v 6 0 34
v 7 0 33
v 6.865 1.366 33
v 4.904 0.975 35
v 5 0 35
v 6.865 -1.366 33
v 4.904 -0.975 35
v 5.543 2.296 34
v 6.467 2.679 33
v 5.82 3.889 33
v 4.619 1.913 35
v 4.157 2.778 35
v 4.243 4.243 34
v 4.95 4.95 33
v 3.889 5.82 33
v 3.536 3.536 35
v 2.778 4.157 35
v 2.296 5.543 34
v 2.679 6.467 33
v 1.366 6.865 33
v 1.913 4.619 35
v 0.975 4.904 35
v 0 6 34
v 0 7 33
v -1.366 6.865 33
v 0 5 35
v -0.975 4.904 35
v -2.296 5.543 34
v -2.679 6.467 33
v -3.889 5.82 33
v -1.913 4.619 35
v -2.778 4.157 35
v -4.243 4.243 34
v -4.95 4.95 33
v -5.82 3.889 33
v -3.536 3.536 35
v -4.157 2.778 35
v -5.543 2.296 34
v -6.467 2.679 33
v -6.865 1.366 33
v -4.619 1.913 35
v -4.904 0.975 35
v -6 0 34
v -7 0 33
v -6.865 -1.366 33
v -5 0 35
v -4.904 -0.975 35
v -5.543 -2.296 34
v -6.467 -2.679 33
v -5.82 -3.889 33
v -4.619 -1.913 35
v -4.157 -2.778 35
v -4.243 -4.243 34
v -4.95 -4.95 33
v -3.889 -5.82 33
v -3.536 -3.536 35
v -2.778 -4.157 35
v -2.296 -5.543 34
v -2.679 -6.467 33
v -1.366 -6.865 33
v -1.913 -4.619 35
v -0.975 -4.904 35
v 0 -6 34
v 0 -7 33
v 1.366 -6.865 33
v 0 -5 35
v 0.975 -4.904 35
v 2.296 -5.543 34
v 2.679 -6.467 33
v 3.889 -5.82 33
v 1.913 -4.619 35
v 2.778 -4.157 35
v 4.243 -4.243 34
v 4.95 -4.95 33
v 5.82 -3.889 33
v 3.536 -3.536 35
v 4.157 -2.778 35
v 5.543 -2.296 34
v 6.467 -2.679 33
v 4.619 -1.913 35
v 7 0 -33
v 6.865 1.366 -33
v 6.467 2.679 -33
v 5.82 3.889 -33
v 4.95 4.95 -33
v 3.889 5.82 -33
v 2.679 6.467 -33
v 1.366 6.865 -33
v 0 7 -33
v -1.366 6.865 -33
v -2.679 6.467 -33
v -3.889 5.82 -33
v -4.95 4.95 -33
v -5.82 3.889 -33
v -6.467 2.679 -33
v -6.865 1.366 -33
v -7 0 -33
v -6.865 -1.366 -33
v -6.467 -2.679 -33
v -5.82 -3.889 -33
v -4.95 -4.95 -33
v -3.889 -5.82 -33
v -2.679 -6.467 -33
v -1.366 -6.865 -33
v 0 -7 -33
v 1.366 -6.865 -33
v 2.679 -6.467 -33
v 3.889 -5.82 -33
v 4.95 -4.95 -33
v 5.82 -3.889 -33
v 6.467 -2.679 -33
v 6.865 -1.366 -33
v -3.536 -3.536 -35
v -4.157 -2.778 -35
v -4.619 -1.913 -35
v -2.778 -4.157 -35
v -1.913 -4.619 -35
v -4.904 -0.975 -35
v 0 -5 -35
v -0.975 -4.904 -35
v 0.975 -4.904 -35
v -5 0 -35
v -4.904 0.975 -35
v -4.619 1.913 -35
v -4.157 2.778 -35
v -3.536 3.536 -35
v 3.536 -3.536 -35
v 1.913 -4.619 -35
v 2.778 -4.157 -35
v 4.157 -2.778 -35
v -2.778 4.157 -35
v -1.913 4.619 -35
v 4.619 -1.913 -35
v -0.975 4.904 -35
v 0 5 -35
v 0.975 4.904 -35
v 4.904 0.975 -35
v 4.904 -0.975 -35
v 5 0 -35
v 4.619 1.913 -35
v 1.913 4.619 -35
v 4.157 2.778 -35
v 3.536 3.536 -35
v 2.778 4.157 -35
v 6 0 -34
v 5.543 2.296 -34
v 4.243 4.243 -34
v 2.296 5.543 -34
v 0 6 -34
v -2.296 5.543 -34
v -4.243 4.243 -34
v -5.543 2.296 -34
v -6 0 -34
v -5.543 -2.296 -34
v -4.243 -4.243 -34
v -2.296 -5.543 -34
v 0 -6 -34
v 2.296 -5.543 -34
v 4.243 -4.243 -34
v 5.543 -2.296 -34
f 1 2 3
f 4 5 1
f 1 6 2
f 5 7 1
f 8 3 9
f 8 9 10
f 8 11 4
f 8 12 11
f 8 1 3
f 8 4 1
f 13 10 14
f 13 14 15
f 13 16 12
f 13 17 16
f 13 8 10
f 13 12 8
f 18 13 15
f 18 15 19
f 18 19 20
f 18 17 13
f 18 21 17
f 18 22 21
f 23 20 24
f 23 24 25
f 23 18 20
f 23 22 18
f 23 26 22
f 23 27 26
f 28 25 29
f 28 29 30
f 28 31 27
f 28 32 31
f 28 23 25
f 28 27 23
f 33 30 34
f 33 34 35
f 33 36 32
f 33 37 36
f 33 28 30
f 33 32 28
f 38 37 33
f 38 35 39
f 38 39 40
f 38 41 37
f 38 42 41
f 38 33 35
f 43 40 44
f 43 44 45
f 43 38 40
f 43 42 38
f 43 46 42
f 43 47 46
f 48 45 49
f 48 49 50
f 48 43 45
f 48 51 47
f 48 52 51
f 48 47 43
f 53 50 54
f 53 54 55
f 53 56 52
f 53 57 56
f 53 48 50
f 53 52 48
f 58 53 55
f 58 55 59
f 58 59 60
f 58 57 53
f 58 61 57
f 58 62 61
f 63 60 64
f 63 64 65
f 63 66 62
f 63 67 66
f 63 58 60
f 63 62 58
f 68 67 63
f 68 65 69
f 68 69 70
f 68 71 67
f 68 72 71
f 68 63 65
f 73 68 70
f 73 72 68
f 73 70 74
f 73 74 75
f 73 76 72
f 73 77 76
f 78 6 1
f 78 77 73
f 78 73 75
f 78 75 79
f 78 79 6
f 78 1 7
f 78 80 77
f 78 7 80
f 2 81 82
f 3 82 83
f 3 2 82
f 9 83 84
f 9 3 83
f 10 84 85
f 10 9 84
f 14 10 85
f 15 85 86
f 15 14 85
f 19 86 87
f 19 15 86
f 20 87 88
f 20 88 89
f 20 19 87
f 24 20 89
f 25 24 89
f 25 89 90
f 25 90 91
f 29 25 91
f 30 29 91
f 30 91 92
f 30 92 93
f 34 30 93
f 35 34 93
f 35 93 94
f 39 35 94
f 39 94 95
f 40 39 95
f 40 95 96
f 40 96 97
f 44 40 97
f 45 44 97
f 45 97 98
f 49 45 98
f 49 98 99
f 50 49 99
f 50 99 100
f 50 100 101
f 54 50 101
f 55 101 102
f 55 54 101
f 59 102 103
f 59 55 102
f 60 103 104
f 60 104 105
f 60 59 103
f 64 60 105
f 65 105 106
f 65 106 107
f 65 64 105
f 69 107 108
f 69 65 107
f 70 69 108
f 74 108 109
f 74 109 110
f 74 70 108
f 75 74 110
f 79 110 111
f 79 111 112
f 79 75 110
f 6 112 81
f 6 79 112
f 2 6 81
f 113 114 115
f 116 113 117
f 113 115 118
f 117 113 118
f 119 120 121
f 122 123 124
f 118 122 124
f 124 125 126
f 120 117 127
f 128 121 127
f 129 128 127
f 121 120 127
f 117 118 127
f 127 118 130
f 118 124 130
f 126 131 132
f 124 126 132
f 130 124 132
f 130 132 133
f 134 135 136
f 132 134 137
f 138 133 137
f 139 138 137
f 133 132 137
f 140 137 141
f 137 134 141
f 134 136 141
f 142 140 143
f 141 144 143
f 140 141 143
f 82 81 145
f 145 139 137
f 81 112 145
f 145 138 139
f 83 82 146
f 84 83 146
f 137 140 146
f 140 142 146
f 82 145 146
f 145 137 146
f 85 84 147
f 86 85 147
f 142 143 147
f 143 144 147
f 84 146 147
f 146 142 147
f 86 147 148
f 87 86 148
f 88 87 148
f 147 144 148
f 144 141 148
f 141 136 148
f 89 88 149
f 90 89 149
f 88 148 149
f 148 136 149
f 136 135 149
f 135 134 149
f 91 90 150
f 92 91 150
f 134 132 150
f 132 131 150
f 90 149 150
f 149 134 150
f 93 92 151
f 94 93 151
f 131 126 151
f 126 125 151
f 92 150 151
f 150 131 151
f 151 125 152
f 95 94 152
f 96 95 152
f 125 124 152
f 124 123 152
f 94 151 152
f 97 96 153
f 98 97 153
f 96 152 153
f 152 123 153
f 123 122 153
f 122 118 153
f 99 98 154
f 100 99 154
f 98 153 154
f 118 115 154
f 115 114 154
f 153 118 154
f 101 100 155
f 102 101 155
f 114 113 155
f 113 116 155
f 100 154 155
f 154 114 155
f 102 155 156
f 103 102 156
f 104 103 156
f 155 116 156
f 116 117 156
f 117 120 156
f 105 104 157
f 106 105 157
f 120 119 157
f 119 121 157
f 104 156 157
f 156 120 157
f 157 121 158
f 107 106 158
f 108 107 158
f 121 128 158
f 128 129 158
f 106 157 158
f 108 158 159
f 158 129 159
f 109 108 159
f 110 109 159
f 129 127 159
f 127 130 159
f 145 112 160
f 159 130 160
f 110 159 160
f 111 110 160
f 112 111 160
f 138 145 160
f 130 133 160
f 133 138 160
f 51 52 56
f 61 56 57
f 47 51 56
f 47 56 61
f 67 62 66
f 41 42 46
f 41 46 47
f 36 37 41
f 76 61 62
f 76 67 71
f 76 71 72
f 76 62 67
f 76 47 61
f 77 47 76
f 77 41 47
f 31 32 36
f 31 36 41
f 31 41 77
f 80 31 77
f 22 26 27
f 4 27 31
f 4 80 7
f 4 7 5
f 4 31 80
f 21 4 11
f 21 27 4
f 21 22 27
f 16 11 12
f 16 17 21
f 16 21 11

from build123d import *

# Parameters (mm, degrees)
SKETCH2_R           = 7
BOSS_EXTRUDE1_DEPTH = 35
CHAMFER1_SIZE       = 2
CHAMFER2_SIZE       = 2


with BuildPart() as part:
    # Sketch2 → Boss-Extrude1 (new body, symmetric)
    with BuildSketch(Plane.XY):
        Circle(SKETCH2_R)
    extrude(amount=BOSS_EXTRUDE1_DEPTH, both=True)

    # Chamfer1
    chamfer1_edges = [part.edges().sort_by_distance(p)[0] for p in [
        (-7, 0, -35),
    ]]
    chamfer(chamfer1_edges, length=CHAMFER1_SIZE)

    # Chamfer2
    chamfer2_edges = [part.edges().sort_by_distance(p)[0] for p in [
        (-7, 0, 35),
    ]]
    chamfer(chamfer2_edges, length=CHAMFER2_SIZE)


solid = part.part
